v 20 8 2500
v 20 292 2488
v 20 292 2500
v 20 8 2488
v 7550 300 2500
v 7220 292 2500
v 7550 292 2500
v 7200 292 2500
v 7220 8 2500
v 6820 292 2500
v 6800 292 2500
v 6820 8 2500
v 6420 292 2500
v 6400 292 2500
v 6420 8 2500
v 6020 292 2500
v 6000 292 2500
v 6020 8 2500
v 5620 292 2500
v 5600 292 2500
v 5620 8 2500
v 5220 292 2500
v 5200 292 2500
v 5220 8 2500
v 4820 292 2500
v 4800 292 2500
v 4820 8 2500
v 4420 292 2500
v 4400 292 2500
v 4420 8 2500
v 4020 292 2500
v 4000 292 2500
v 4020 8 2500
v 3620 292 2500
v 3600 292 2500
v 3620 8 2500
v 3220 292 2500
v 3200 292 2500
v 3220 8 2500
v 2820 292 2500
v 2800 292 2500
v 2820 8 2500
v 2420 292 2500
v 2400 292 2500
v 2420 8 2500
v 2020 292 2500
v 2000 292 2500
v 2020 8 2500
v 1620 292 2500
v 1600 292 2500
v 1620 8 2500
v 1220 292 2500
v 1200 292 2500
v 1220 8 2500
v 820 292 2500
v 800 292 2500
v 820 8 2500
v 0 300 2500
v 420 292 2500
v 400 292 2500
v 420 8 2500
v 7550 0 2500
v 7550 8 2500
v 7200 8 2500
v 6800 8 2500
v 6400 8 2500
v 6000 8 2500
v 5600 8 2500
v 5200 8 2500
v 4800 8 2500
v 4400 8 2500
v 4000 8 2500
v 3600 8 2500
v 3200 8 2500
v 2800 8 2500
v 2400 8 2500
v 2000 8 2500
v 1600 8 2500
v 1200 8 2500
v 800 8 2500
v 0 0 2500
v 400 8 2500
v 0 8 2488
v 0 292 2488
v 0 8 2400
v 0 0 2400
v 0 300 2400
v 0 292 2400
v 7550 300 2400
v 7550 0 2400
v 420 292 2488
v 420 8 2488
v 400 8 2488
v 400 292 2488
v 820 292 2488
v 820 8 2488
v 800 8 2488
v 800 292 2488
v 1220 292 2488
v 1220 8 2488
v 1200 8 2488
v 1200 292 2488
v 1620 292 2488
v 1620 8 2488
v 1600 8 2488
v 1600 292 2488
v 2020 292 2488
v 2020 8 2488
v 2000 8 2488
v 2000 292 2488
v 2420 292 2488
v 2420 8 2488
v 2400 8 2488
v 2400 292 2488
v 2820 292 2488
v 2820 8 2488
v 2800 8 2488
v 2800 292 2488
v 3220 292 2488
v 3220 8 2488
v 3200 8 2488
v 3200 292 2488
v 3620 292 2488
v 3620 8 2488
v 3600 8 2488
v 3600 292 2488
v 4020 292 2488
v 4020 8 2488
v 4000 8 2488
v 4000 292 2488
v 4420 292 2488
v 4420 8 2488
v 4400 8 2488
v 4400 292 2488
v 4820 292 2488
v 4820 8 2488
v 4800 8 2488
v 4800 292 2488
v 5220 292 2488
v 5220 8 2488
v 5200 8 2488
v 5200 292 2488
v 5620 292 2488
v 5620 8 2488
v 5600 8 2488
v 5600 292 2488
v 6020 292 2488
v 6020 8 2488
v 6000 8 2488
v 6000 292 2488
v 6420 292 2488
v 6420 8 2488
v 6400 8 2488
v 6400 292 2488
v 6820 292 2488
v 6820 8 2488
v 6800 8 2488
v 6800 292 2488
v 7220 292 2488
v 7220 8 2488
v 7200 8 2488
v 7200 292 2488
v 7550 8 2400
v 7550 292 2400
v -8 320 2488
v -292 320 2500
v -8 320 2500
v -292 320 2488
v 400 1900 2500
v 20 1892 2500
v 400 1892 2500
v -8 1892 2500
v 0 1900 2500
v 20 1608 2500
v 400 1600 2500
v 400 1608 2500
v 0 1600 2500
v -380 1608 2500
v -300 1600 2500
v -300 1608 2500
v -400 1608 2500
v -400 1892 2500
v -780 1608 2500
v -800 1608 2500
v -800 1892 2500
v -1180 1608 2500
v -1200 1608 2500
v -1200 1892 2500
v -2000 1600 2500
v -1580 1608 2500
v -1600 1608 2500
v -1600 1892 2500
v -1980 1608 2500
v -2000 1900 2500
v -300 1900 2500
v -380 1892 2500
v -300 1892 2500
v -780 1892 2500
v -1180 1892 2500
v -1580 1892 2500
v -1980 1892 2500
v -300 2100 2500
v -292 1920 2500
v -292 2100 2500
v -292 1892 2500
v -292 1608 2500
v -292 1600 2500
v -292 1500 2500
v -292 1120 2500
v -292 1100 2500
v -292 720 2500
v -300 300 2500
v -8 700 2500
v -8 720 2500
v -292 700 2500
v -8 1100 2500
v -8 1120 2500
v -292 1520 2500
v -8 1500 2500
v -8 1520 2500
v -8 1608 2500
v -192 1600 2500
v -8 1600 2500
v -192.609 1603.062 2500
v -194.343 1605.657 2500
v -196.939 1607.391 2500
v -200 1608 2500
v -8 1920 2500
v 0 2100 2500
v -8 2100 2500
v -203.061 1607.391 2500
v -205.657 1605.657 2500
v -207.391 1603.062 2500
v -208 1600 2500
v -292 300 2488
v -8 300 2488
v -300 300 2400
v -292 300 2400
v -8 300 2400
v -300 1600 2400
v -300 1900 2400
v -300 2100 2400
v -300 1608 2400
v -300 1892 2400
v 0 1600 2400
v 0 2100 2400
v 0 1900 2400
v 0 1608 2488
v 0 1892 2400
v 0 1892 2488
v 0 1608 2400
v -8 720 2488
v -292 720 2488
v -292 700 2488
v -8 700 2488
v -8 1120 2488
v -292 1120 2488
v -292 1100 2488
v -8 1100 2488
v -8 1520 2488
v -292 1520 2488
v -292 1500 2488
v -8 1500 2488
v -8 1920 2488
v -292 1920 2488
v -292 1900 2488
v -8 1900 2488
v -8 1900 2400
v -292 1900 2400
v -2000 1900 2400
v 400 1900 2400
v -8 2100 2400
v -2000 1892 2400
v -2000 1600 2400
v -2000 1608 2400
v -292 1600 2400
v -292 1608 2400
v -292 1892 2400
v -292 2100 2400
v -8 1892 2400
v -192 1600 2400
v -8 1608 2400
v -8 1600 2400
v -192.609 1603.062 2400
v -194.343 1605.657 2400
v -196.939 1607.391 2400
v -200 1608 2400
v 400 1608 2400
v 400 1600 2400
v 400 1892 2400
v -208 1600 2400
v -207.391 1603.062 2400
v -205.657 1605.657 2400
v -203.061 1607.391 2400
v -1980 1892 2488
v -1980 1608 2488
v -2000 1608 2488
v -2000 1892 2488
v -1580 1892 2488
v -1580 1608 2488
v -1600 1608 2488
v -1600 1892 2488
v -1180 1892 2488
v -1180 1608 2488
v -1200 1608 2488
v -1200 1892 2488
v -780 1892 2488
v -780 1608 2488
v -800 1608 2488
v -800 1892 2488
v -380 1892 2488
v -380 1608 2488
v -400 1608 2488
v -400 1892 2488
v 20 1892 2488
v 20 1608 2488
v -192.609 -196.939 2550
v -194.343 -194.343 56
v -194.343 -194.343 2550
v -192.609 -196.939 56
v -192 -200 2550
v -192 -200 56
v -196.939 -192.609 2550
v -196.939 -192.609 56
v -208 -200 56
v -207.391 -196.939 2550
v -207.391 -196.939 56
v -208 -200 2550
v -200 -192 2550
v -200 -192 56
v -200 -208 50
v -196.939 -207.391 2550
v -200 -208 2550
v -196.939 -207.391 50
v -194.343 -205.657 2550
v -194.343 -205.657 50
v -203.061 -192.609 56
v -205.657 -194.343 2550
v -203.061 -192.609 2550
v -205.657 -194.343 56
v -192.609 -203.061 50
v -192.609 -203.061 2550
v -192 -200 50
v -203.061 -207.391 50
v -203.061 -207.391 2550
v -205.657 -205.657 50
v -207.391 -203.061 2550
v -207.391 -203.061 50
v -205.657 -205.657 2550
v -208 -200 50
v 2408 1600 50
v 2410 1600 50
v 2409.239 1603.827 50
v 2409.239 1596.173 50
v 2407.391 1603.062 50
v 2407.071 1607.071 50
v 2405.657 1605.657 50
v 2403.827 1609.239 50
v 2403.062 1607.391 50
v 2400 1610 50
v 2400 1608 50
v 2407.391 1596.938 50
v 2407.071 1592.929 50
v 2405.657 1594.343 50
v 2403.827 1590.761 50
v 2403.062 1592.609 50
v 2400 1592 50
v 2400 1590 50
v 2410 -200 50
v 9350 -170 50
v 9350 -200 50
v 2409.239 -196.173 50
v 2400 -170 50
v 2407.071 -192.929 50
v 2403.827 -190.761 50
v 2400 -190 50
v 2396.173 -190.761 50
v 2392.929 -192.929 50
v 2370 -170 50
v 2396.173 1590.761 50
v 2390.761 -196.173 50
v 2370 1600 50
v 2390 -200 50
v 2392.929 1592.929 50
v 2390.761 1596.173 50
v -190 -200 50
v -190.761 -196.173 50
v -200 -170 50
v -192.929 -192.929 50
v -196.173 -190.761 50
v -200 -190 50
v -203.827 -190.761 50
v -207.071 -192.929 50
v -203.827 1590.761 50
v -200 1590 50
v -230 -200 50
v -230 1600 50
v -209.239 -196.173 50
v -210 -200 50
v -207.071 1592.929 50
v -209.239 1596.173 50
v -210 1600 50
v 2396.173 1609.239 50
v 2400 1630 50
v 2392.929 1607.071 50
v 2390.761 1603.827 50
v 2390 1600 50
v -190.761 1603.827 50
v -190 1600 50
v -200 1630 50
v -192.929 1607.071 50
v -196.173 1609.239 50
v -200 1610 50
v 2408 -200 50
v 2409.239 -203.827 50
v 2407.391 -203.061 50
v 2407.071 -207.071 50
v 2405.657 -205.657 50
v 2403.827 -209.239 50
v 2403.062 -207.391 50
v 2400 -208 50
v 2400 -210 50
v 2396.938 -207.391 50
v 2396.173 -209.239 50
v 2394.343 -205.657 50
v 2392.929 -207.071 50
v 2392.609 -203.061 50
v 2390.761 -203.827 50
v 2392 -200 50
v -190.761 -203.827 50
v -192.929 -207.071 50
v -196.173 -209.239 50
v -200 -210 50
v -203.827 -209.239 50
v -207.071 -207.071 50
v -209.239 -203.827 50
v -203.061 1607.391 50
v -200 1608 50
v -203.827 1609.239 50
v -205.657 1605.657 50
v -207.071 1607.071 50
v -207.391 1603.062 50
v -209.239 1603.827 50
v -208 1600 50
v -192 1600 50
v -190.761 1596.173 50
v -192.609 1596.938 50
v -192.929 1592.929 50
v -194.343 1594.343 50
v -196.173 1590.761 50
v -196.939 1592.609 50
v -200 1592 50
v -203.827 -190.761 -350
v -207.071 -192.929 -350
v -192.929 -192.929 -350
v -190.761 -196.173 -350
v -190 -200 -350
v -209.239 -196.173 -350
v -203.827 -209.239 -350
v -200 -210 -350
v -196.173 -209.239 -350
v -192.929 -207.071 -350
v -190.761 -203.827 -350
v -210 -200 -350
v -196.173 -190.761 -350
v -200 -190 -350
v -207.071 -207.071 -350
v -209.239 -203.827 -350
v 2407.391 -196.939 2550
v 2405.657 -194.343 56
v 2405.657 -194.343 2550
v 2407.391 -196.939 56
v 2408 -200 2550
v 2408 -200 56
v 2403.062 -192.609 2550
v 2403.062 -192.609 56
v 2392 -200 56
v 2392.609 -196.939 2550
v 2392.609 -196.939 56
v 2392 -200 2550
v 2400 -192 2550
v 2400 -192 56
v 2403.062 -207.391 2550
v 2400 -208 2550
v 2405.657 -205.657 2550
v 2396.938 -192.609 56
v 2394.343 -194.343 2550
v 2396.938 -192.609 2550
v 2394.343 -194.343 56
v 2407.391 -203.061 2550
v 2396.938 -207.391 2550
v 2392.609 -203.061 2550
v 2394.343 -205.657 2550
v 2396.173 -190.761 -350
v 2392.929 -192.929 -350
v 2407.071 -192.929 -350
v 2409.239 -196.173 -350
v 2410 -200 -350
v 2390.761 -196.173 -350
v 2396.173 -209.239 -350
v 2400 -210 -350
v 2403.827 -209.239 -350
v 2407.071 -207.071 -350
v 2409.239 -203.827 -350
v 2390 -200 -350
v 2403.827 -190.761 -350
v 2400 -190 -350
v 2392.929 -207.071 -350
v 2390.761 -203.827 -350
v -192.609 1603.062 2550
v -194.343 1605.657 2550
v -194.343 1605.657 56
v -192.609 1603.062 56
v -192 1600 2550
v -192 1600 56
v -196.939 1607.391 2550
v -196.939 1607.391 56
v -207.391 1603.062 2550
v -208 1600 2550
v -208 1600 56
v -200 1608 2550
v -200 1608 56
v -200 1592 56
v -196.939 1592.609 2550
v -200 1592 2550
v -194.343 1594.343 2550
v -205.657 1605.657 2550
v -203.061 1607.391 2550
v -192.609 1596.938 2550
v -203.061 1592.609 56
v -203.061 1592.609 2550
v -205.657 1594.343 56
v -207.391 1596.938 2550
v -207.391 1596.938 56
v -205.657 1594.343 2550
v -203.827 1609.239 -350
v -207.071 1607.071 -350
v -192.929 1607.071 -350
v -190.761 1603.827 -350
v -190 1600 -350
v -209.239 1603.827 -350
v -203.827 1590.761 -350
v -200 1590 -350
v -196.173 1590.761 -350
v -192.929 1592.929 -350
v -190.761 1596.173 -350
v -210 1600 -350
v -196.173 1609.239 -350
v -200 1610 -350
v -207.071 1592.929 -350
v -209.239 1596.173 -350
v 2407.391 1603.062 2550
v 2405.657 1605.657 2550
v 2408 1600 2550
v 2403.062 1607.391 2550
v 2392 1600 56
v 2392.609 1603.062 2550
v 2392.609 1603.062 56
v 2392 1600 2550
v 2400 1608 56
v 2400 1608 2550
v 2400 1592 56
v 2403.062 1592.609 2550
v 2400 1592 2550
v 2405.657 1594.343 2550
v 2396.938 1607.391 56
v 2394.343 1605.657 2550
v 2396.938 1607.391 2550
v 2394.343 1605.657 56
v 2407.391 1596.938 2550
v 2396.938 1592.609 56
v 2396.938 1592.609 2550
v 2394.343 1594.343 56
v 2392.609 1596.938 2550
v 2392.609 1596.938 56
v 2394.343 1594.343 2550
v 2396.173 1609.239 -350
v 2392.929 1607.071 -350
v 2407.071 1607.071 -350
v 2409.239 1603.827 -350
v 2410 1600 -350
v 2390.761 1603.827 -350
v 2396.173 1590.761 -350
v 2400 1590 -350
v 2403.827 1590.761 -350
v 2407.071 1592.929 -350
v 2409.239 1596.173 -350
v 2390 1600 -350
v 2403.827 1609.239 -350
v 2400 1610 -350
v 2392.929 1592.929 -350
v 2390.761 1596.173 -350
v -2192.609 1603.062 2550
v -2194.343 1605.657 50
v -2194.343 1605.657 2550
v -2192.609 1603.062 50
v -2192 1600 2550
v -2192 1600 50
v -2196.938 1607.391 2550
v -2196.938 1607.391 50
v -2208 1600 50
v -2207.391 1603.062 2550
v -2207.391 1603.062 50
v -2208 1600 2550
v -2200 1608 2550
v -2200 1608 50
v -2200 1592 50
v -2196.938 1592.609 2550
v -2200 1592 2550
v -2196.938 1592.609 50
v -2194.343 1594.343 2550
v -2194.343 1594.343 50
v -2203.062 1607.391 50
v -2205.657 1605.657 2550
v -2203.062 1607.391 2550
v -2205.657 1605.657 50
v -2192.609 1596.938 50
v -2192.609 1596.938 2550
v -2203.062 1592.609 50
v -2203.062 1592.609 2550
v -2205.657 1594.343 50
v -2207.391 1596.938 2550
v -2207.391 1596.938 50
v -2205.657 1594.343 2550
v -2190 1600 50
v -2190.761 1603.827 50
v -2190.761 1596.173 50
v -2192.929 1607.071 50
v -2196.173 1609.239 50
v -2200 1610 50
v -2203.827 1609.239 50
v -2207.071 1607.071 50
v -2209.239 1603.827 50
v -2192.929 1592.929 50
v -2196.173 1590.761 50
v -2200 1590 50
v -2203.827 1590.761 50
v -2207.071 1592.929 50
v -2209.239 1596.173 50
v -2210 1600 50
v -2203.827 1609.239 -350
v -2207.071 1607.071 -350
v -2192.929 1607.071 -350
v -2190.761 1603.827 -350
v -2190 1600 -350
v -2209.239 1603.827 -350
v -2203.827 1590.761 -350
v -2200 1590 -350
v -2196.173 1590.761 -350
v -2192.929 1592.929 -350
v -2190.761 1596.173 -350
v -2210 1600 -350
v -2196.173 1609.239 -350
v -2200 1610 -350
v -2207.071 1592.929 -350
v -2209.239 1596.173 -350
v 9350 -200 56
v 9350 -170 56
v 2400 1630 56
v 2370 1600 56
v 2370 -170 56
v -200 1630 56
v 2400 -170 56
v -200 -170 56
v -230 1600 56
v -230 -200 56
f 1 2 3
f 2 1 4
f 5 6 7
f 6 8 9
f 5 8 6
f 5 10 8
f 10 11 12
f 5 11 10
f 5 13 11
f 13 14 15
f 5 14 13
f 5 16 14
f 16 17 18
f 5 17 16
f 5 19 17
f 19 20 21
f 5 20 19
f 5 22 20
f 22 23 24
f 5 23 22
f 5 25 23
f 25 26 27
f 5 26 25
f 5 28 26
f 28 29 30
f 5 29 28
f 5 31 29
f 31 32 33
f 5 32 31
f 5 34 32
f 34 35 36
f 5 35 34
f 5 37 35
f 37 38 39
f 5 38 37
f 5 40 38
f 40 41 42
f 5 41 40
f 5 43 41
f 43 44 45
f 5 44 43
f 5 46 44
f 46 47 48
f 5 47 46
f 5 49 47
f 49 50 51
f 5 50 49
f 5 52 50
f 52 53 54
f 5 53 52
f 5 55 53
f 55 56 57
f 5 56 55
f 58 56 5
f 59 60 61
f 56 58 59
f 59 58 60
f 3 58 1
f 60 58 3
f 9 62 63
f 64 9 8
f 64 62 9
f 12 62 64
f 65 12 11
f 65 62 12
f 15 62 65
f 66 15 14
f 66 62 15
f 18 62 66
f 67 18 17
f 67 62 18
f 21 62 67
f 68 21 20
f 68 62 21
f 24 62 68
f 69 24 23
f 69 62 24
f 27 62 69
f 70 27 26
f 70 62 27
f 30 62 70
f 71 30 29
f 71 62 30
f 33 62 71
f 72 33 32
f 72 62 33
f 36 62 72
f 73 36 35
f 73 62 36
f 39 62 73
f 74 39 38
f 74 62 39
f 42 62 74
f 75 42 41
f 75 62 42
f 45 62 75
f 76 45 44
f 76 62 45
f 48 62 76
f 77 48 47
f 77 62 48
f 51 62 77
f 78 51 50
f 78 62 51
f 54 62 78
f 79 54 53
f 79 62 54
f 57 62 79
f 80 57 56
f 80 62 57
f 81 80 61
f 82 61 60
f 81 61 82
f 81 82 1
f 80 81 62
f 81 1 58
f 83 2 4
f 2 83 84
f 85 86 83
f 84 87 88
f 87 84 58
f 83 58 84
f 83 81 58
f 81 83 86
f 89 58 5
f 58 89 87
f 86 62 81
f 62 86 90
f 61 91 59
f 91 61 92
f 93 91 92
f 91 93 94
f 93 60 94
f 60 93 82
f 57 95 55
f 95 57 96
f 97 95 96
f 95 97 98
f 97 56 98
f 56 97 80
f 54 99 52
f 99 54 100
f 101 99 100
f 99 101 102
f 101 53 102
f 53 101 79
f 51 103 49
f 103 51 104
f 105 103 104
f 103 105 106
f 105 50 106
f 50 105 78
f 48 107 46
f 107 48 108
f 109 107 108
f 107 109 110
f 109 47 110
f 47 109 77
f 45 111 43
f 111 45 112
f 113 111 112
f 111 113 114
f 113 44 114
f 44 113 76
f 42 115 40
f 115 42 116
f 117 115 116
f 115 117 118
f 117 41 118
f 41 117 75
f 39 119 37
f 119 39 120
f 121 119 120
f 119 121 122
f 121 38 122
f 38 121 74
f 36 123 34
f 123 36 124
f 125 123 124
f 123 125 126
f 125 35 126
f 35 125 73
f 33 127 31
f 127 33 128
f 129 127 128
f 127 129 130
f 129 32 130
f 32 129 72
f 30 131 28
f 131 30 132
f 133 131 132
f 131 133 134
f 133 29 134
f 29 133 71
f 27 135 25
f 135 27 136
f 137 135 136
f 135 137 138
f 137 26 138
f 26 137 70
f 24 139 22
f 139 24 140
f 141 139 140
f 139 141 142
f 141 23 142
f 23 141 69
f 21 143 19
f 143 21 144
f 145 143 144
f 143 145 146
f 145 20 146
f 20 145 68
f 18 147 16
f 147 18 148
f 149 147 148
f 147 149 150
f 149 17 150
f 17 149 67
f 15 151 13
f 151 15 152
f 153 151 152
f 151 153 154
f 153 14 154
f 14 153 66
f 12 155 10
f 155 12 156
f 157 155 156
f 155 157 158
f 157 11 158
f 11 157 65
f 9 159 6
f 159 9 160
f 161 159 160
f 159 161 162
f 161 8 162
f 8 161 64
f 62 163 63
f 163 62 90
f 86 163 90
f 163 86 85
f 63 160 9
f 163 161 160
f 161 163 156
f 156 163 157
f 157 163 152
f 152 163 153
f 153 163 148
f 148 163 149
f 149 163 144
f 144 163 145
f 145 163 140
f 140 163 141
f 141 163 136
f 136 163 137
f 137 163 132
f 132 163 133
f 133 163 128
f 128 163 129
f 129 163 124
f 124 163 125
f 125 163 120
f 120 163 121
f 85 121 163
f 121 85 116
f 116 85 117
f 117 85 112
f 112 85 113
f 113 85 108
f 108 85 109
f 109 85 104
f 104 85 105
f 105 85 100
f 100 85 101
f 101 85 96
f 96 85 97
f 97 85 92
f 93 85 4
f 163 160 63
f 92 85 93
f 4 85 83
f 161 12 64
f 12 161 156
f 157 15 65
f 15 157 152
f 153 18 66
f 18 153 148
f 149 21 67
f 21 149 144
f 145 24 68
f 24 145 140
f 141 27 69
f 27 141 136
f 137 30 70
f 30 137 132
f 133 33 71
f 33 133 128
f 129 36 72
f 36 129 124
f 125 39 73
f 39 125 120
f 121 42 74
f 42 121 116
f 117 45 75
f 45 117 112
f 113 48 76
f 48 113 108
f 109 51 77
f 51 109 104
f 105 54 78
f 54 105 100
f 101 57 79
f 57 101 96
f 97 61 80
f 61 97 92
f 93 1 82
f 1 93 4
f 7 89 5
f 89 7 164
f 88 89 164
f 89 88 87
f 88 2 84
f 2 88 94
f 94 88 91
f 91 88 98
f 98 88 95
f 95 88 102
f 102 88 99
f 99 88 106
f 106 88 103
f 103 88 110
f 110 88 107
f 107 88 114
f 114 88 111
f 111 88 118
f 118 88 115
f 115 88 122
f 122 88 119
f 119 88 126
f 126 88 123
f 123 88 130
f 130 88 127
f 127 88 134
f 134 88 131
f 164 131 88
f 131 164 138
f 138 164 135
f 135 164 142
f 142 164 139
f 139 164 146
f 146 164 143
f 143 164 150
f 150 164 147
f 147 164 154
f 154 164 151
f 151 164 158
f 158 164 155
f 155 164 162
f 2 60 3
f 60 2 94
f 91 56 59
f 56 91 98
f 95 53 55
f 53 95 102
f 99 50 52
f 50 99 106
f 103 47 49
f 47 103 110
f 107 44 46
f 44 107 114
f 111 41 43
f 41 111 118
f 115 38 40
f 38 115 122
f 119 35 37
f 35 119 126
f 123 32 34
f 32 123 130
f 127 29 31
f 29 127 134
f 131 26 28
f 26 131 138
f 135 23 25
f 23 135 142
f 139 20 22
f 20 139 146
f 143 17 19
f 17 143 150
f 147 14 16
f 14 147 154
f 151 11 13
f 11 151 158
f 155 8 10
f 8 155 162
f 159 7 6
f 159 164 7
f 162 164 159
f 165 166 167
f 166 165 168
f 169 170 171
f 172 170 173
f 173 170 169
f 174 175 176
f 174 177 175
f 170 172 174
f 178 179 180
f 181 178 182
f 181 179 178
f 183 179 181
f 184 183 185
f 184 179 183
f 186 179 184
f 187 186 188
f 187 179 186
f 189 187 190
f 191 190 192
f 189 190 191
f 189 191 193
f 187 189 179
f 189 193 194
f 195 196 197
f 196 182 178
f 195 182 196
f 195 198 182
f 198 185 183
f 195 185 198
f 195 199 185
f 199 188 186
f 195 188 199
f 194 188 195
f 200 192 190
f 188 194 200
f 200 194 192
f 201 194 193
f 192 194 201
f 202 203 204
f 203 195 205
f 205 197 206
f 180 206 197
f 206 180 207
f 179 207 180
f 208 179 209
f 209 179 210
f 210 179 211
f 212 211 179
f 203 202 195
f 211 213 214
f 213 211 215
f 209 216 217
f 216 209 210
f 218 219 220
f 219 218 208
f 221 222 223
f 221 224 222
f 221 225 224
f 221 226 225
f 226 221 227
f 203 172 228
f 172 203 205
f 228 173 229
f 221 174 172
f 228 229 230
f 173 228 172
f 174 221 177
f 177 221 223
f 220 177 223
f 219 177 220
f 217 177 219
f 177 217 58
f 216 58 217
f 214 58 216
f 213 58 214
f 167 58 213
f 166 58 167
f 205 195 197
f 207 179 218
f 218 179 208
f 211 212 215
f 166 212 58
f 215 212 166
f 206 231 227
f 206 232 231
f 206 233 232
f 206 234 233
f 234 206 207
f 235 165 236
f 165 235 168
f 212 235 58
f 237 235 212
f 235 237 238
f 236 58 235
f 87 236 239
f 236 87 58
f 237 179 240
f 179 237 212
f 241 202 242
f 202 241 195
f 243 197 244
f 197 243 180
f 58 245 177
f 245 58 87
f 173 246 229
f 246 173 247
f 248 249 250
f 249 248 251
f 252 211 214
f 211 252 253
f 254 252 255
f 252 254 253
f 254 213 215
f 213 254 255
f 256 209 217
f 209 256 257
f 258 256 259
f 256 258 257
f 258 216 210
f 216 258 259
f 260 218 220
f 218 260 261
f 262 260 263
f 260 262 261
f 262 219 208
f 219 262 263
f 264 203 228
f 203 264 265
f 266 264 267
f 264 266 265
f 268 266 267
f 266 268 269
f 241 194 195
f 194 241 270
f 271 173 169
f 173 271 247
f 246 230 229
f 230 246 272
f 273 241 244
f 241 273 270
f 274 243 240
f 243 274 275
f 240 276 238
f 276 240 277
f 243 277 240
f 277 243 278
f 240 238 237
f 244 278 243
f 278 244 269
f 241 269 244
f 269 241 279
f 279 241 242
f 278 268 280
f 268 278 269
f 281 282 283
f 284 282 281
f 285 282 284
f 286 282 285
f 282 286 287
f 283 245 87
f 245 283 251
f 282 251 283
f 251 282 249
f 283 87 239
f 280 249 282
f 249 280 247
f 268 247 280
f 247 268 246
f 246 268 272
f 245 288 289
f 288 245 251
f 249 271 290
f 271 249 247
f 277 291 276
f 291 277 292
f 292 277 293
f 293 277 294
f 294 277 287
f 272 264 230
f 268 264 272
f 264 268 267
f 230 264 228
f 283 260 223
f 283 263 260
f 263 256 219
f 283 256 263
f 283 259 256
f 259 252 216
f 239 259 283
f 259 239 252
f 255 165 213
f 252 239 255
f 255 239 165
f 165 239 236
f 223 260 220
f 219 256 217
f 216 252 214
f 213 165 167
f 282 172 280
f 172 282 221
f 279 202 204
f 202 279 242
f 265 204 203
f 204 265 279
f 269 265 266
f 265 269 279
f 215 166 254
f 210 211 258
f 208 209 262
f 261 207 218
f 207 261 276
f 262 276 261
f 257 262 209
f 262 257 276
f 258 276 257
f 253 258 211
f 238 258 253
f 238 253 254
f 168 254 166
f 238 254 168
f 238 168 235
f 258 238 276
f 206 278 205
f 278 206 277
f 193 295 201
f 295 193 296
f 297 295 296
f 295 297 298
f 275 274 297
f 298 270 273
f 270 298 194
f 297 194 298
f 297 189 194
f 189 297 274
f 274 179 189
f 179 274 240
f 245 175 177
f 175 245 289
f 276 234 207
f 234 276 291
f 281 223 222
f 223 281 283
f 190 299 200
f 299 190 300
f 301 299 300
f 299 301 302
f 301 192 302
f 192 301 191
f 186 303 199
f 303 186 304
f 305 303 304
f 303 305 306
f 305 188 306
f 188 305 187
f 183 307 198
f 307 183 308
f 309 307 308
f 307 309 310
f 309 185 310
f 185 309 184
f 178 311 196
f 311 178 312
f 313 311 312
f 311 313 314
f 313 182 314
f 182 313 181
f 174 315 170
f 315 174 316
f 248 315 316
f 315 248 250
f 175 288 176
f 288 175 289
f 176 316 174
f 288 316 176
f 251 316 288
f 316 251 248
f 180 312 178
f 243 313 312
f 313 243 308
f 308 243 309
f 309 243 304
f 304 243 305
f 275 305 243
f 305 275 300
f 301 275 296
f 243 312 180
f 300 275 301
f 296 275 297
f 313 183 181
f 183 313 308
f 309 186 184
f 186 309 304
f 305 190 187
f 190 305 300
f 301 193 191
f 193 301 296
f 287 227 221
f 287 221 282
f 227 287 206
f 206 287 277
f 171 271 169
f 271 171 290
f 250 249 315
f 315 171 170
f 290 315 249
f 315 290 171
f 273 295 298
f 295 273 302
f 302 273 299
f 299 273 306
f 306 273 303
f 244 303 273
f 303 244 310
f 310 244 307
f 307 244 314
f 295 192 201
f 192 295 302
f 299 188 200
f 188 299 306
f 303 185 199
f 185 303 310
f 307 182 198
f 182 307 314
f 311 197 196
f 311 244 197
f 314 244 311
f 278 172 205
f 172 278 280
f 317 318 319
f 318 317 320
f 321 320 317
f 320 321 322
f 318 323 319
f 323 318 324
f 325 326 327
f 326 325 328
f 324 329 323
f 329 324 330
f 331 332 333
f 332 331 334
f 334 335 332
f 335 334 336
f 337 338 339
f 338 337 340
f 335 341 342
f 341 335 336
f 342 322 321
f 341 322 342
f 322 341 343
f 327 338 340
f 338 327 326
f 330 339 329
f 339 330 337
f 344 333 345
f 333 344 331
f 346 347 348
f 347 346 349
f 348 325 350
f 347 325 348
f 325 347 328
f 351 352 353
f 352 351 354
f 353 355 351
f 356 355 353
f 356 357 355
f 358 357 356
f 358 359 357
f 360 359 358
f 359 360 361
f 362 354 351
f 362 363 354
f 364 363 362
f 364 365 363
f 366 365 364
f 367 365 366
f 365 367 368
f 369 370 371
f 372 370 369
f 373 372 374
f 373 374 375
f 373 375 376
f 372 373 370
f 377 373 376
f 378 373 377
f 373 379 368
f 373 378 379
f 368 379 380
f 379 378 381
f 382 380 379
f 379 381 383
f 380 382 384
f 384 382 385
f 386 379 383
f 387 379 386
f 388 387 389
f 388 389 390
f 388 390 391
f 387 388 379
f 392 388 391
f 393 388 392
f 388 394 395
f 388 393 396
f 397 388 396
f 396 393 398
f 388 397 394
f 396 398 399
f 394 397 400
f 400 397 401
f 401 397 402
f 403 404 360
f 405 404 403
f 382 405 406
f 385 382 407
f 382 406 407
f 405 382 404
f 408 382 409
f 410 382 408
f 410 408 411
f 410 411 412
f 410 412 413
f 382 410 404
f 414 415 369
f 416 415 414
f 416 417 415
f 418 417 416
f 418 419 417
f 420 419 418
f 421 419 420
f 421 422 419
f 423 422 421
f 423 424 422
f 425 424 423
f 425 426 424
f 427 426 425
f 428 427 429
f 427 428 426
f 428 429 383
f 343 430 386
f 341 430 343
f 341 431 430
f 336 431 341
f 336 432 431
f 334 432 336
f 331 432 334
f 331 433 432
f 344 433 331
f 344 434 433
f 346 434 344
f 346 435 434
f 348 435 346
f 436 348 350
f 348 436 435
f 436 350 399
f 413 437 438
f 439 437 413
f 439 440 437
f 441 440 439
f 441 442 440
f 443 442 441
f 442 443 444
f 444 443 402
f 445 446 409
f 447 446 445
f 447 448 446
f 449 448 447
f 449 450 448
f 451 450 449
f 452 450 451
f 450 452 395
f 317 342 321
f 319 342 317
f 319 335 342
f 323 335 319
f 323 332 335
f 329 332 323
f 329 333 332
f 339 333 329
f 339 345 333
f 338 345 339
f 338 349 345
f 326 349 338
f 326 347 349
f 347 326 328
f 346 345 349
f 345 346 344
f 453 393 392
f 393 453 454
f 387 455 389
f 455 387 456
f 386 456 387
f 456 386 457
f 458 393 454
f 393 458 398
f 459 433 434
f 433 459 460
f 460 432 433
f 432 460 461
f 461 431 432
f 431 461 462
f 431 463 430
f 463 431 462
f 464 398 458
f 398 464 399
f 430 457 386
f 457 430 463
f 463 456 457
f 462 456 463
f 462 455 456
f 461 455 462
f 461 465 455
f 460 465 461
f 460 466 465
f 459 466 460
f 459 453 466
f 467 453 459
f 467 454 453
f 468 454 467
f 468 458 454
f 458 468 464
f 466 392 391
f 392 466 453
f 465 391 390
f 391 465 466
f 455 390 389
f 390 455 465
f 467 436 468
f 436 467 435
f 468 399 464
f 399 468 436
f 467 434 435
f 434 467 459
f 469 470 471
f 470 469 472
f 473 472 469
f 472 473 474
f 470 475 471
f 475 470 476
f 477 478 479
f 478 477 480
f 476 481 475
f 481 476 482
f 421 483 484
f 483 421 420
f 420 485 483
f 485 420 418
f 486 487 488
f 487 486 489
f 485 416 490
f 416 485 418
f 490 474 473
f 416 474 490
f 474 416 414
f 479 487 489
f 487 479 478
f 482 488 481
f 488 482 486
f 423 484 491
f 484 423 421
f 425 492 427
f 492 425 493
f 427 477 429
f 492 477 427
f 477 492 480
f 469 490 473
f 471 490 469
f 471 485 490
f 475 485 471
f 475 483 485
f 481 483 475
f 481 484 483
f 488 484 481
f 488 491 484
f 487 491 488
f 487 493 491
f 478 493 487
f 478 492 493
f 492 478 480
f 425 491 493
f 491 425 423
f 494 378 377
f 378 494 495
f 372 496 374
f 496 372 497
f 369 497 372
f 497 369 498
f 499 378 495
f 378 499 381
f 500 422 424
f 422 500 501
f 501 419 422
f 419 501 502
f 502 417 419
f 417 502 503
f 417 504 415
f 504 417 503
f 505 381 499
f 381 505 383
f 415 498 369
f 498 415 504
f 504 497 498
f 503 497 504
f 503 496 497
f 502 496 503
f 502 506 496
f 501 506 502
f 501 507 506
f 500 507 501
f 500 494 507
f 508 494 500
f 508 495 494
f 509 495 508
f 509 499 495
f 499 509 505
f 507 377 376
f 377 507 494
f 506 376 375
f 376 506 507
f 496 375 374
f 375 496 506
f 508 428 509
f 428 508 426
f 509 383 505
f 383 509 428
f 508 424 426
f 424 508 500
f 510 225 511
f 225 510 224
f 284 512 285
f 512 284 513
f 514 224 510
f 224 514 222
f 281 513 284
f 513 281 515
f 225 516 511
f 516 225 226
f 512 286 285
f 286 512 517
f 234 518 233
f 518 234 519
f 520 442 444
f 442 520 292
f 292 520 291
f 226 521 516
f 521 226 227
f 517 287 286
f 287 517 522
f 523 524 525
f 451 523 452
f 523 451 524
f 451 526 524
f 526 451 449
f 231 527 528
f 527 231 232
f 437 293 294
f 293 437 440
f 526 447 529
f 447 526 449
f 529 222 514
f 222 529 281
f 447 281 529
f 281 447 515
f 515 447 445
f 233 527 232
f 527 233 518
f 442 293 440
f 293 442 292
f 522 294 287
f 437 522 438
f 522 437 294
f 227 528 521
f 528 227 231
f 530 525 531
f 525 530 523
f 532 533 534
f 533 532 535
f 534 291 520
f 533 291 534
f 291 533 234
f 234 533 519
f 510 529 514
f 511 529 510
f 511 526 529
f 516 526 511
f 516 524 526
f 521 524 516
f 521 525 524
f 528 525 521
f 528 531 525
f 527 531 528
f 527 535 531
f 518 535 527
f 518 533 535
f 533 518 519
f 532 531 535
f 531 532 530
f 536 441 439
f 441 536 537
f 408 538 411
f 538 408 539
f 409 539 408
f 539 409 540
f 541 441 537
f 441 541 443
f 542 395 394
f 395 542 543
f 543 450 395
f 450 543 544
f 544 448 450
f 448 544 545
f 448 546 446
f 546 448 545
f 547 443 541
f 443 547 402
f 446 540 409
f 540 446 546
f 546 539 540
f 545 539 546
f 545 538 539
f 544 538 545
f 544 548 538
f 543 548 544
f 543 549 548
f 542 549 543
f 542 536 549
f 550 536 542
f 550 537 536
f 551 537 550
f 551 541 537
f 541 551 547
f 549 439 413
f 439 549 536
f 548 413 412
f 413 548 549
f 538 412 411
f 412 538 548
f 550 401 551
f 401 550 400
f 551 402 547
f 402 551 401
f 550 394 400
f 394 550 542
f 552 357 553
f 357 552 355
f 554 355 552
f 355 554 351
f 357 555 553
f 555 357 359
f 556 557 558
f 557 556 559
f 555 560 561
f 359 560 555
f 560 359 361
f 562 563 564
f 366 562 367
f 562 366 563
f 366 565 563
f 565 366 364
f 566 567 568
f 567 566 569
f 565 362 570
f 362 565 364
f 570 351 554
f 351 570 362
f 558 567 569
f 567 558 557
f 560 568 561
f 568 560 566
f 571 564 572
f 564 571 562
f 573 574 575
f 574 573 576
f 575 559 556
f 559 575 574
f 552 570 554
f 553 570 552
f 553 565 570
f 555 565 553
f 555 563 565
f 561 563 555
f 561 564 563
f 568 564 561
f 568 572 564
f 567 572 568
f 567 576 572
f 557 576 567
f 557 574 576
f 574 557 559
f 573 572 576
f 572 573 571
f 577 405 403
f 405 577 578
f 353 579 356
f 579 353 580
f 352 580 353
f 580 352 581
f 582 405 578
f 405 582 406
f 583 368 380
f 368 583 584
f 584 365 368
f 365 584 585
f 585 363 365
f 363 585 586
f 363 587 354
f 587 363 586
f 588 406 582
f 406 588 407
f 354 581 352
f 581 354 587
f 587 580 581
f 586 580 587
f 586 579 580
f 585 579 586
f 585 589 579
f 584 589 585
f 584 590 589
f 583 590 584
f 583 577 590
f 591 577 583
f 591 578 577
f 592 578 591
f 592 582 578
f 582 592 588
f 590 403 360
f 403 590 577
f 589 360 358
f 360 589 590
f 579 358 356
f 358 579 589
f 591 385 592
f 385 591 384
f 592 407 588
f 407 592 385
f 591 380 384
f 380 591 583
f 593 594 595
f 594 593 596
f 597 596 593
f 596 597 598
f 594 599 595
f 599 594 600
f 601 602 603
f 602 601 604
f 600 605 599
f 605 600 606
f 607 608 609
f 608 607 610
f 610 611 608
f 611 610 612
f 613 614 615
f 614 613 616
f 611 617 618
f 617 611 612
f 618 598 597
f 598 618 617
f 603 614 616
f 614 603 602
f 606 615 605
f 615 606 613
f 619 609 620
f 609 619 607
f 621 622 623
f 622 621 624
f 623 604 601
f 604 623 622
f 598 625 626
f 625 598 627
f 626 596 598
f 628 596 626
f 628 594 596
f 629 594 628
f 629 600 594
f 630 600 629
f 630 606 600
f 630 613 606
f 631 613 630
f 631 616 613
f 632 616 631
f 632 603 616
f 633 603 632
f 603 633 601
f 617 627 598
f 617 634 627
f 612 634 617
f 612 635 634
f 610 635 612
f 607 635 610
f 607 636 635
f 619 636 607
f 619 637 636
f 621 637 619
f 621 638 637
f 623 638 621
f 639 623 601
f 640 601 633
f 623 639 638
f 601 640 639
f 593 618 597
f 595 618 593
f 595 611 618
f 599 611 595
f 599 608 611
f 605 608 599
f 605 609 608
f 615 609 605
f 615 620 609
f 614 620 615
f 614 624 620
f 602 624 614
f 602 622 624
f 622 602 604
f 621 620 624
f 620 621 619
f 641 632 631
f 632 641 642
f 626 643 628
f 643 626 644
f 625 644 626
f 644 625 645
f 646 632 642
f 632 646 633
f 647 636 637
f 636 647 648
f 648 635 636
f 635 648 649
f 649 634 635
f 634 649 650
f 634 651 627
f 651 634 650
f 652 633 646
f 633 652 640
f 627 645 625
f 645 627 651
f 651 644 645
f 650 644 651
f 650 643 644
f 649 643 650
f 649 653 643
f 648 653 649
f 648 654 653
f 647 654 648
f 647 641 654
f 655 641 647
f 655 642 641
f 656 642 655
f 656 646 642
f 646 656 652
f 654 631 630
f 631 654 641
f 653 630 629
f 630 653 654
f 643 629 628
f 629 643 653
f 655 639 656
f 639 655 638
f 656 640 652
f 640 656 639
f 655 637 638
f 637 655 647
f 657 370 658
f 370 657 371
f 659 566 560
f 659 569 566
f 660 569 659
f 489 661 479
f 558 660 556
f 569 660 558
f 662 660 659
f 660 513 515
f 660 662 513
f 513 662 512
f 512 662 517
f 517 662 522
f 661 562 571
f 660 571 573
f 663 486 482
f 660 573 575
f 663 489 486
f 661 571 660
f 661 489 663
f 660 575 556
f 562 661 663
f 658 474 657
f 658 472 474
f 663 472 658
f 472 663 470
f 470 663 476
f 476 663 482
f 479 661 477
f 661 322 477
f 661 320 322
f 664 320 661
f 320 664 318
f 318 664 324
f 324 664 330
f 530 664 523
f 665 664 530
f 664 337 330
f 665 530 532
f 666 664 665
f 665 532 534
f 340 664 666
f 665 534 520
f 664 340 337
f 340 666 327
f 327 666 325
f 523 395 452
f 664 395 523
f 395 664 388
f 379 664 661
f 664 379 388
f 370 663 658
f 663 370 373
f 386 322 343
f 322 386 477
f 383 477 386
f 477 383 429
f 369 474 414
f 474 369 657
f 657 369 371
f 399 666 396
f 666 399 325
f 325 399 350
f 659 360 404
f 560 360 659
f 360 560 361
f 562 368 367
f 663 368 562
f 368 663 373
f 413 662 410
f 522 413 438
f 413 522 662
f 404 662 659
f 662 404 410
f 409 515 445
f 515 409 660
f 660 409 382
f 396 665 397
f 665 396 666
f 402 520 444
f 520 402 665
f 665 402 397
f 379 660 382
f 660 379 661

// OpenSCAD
// file: ../params.scad
// Shared millimetre parameters. Keep in lockstep with freecad/params.py.
// Module scale: 150 kg/day wet train. Walls are CPVC sheet, not metal.

$fn = 36;

WALL        = 12;     // CPVC sheet thickness
FLOOR       = 16;     // floor plate (trough sits on this)

// LEACH CSTR 1 — inside liquor box
CSTR_L      = 2000;
CSTR_W      = 1200;
CSTR_H      = 1400;   // liquid + freeboard
FREEBOARD   = 200;

// CSTR 2 weir (same vessel, +X wall)
WEIR_W      = 450;
WEIR_CREST  = CSTR_H - FREEBOARD;   // from inner floor
WEIR_SLOT_H = 80;
WEIR_LIP    = 120;    // external spout projection

// CSTR 3 floor auger — injection-molded PVC / FG
AUGER_D     = 140;    // flight OD
AUGER_SHAFT = 40;
AUGER_PITCH = 110;
AUGER_TROUGH_W = 180;
AUGER_TROUGH_H = 110;
AUGER_OFFSET_Y = 280; // trough centreline from inner -Y wall
AUGER_INCLINE  = 28;  // deg, lifts out of liquor toward +X

// mixer / nozzles (lid)
MIXER_D     = 50;
GAS_D       = 80;     // acid-gas takeoff
DROP_X      = 80;     // inner-X of shred drop slot
DROP_L      = 400;
DROP_W      = 250;
DROP_COAM   = 80;     // raised coaming around the slot

// LEACHATE PUMP / coarse strainer — −X wall, opposite the weir
PUMP_D      = 80;     // DN80
PUMP_Z      = 450;    // centreline above inner floor (submerged)
PUMP_Y      = 900;    // centreline from inner −Y (away from auger)
STRAINER_L  = 180;
STRAINER_W  = 140;
STRAINER_H  = 160;

// mezzanine feed train
MEZZ_H      = 2200;   // platform top above tank outer floor
MEZZ_L      = 1600;   // platform length in −X
MEZZ_THK    = 12;
HOPPER_L    = 700;
HOPPER_W    = 600;
HOPPER_H    = 800;
SHRED_L     = 500;
SHRED_W     = 500;
SHRED_H     = 450;
CONV_W      = 240;
CONV_H      = 120;
CONV_PLATE  = 6;      // trough plate
CONV_FLANGE = 40;
CONV_SPRING_D = 50;
CONV_SPRING_H = 80;
CONV_BOLT   = 10;     // M10 clearance
CONV_LEN    = 1800;   // default standalone length; plant instance is computed
DUST_D      = 150;    // dust-hood outlet to DUST header
AUGER_LIFT_L = 700;

// dewater belts + split (Phase A 4–6)
FDEW_L      = 1800;
FDEW_W      = 450;
FDEW_H      = 80;
FDEW_RISE   = 120;    // solids end higher so liquor runs back to weir
SDEW_L      = 1400;
SDEW_W      = 220;
SDEW_H      = 80;
SPLIT_L     = 600;
SPLIT_W     = 500;
SPLIT_H     = 400;
STUB_L      = 400;
STUB_W      = 300;
STUB_H      = 250;

// EW funnel cell
EW_L        = 600;    // along aisle (overflow direction)
EW_W        = 420;    // anode-cathode depth
EW_H        = 650;    // rectangular body
EW_FUNNEL_H = 220;
EW_VALVE_D  = 50;
EW_VALVE_L  = 60;
EW_MEM_T    = 4;      // CEM
EW_SLOT     = 10;     // membrane cassette slot
EW_PITCH    = 750;    // aisle spacing, centre to centre
AISLE_X0    = 200;
AISLE_Y     = -(EW_W + 2*WALL) - 400;
AISLE_Z     = 400;
BUND_H      = 150;
BUND_PAD    = 250;
SUMP_L      = 400;
SUMP_W      = 400;
SUMP_H      = 300;
VDF_D       = 700;
VDF_L       = 900;
PAIL_W      = 180;
HDR_D       = 80;
HDR_Z       = 1400;
PYRO_D      = 320;
PYRO_L      = 2800;

// Campus envelopes — lockstep with freecad/params.py
FARM_X=12000; FARM_Y=8000; FARM_L=12000; FARM_W=8000; FARM_H=4500;
FAB_X=12000;  FAB_Y=-6000; FAB_L=8000;   FAB_W=6000;  FAB_H=4000;
HAB_X=-8000;  HAB_Y=8000;  HAB_L=8000;   HAB_W=6000;  HAB_H=3200;
CRYO_X=-6000; CRYO_Y=-4000; CRYO_L=4000; CRYO_W=3000; CRYO_H=3000;
MFG_X=2000;   MFG_Y=9000;  MFG_L=6000;   MFG_W=4000;  MFG_H=3500;

LIFE_Z_GREY=900; LIFE_Z_UPW=1100; LIFE_Z_ETCH=1300;
LIFE_Z_O2=2800; LIFE_Z_N2=3000; LIFE_Z_CO2=3200;
LIFE_D_GREY=50; LIFE_D_UPW=40; LIFE_D_ETCH=32;
LIFE_D_GAS=25; LIFE_D_CO2=40;
// main file
// Ladder tray + grounding ring. Tray is not a gas header.
// DC bus and 480 V stay outside both process atmospheres.
include <../params.scad>;
$fn = 16;

TRAY_W = 300;
TRAY_H = 100;
RUNG   = 400;

module ladder(len) {
    cube([len, 8, TRAY_H]);
    translate([0, TRAY_W - 8, 0]) cube([len, 8, TRAY_H]);
    for (x = [0:RUNG:len-20])
        translate([x, 0, TRAY_H - 12]) cube([20, TRAY_W, 12]);
}

module rod(h=2500) {
    cylinder(h=h, d=16);
    translate([0, 0, -400]) cylinder(h=400, d=20); // below grade
}

module ring_bar(l) { cube([l, 30, 6]); }

module mfg_cable_tray() {
    // aisle back-side tray: rectifier → EW hangers, 2.4 m
    translate([0, 0, 2400]) ladder(9*EW_PITCH + 800);
    // drop to rectifier yard (−X)
    translate([0, TRAY_W, 2400])
        rotate([0, 0, 90]) ladder(1800);
    // 480 V tray, electrical yard only
    translate([-2000, 1600, 2400]) ladder(2400);

    // ground ring around CSTR + aisle footprint
    translate([-200, -200, 50]) ring_bar(CSTR_L + 9*EW_PITCH + 800);
    translate([-200, CSTR_W + 400, 50]) ring_bar(CSTR_L + 600);
    translate([-200, -200, 50]) rotate([0, 0, 90]) ring_bar(CSTR_W + 600);
    translate([CSTR_L + 400, -200, 50]) rotate([0, 0, 90]) ring_bar(CSTR_W + 600);

    translate([-200, -200, 50]) rod();
    translate([CSTR_L + 400, -200, 50]) rod();
    translate([-200, CSTR_W + 400, 50]) rod();
    translate([CSTR_L + 400, CSTR_W + 400, 50]) rod();
    // extra rod at rectifier
    translate([-2200, 1600, 50]) rod();
}

mfg_cable_tray();
